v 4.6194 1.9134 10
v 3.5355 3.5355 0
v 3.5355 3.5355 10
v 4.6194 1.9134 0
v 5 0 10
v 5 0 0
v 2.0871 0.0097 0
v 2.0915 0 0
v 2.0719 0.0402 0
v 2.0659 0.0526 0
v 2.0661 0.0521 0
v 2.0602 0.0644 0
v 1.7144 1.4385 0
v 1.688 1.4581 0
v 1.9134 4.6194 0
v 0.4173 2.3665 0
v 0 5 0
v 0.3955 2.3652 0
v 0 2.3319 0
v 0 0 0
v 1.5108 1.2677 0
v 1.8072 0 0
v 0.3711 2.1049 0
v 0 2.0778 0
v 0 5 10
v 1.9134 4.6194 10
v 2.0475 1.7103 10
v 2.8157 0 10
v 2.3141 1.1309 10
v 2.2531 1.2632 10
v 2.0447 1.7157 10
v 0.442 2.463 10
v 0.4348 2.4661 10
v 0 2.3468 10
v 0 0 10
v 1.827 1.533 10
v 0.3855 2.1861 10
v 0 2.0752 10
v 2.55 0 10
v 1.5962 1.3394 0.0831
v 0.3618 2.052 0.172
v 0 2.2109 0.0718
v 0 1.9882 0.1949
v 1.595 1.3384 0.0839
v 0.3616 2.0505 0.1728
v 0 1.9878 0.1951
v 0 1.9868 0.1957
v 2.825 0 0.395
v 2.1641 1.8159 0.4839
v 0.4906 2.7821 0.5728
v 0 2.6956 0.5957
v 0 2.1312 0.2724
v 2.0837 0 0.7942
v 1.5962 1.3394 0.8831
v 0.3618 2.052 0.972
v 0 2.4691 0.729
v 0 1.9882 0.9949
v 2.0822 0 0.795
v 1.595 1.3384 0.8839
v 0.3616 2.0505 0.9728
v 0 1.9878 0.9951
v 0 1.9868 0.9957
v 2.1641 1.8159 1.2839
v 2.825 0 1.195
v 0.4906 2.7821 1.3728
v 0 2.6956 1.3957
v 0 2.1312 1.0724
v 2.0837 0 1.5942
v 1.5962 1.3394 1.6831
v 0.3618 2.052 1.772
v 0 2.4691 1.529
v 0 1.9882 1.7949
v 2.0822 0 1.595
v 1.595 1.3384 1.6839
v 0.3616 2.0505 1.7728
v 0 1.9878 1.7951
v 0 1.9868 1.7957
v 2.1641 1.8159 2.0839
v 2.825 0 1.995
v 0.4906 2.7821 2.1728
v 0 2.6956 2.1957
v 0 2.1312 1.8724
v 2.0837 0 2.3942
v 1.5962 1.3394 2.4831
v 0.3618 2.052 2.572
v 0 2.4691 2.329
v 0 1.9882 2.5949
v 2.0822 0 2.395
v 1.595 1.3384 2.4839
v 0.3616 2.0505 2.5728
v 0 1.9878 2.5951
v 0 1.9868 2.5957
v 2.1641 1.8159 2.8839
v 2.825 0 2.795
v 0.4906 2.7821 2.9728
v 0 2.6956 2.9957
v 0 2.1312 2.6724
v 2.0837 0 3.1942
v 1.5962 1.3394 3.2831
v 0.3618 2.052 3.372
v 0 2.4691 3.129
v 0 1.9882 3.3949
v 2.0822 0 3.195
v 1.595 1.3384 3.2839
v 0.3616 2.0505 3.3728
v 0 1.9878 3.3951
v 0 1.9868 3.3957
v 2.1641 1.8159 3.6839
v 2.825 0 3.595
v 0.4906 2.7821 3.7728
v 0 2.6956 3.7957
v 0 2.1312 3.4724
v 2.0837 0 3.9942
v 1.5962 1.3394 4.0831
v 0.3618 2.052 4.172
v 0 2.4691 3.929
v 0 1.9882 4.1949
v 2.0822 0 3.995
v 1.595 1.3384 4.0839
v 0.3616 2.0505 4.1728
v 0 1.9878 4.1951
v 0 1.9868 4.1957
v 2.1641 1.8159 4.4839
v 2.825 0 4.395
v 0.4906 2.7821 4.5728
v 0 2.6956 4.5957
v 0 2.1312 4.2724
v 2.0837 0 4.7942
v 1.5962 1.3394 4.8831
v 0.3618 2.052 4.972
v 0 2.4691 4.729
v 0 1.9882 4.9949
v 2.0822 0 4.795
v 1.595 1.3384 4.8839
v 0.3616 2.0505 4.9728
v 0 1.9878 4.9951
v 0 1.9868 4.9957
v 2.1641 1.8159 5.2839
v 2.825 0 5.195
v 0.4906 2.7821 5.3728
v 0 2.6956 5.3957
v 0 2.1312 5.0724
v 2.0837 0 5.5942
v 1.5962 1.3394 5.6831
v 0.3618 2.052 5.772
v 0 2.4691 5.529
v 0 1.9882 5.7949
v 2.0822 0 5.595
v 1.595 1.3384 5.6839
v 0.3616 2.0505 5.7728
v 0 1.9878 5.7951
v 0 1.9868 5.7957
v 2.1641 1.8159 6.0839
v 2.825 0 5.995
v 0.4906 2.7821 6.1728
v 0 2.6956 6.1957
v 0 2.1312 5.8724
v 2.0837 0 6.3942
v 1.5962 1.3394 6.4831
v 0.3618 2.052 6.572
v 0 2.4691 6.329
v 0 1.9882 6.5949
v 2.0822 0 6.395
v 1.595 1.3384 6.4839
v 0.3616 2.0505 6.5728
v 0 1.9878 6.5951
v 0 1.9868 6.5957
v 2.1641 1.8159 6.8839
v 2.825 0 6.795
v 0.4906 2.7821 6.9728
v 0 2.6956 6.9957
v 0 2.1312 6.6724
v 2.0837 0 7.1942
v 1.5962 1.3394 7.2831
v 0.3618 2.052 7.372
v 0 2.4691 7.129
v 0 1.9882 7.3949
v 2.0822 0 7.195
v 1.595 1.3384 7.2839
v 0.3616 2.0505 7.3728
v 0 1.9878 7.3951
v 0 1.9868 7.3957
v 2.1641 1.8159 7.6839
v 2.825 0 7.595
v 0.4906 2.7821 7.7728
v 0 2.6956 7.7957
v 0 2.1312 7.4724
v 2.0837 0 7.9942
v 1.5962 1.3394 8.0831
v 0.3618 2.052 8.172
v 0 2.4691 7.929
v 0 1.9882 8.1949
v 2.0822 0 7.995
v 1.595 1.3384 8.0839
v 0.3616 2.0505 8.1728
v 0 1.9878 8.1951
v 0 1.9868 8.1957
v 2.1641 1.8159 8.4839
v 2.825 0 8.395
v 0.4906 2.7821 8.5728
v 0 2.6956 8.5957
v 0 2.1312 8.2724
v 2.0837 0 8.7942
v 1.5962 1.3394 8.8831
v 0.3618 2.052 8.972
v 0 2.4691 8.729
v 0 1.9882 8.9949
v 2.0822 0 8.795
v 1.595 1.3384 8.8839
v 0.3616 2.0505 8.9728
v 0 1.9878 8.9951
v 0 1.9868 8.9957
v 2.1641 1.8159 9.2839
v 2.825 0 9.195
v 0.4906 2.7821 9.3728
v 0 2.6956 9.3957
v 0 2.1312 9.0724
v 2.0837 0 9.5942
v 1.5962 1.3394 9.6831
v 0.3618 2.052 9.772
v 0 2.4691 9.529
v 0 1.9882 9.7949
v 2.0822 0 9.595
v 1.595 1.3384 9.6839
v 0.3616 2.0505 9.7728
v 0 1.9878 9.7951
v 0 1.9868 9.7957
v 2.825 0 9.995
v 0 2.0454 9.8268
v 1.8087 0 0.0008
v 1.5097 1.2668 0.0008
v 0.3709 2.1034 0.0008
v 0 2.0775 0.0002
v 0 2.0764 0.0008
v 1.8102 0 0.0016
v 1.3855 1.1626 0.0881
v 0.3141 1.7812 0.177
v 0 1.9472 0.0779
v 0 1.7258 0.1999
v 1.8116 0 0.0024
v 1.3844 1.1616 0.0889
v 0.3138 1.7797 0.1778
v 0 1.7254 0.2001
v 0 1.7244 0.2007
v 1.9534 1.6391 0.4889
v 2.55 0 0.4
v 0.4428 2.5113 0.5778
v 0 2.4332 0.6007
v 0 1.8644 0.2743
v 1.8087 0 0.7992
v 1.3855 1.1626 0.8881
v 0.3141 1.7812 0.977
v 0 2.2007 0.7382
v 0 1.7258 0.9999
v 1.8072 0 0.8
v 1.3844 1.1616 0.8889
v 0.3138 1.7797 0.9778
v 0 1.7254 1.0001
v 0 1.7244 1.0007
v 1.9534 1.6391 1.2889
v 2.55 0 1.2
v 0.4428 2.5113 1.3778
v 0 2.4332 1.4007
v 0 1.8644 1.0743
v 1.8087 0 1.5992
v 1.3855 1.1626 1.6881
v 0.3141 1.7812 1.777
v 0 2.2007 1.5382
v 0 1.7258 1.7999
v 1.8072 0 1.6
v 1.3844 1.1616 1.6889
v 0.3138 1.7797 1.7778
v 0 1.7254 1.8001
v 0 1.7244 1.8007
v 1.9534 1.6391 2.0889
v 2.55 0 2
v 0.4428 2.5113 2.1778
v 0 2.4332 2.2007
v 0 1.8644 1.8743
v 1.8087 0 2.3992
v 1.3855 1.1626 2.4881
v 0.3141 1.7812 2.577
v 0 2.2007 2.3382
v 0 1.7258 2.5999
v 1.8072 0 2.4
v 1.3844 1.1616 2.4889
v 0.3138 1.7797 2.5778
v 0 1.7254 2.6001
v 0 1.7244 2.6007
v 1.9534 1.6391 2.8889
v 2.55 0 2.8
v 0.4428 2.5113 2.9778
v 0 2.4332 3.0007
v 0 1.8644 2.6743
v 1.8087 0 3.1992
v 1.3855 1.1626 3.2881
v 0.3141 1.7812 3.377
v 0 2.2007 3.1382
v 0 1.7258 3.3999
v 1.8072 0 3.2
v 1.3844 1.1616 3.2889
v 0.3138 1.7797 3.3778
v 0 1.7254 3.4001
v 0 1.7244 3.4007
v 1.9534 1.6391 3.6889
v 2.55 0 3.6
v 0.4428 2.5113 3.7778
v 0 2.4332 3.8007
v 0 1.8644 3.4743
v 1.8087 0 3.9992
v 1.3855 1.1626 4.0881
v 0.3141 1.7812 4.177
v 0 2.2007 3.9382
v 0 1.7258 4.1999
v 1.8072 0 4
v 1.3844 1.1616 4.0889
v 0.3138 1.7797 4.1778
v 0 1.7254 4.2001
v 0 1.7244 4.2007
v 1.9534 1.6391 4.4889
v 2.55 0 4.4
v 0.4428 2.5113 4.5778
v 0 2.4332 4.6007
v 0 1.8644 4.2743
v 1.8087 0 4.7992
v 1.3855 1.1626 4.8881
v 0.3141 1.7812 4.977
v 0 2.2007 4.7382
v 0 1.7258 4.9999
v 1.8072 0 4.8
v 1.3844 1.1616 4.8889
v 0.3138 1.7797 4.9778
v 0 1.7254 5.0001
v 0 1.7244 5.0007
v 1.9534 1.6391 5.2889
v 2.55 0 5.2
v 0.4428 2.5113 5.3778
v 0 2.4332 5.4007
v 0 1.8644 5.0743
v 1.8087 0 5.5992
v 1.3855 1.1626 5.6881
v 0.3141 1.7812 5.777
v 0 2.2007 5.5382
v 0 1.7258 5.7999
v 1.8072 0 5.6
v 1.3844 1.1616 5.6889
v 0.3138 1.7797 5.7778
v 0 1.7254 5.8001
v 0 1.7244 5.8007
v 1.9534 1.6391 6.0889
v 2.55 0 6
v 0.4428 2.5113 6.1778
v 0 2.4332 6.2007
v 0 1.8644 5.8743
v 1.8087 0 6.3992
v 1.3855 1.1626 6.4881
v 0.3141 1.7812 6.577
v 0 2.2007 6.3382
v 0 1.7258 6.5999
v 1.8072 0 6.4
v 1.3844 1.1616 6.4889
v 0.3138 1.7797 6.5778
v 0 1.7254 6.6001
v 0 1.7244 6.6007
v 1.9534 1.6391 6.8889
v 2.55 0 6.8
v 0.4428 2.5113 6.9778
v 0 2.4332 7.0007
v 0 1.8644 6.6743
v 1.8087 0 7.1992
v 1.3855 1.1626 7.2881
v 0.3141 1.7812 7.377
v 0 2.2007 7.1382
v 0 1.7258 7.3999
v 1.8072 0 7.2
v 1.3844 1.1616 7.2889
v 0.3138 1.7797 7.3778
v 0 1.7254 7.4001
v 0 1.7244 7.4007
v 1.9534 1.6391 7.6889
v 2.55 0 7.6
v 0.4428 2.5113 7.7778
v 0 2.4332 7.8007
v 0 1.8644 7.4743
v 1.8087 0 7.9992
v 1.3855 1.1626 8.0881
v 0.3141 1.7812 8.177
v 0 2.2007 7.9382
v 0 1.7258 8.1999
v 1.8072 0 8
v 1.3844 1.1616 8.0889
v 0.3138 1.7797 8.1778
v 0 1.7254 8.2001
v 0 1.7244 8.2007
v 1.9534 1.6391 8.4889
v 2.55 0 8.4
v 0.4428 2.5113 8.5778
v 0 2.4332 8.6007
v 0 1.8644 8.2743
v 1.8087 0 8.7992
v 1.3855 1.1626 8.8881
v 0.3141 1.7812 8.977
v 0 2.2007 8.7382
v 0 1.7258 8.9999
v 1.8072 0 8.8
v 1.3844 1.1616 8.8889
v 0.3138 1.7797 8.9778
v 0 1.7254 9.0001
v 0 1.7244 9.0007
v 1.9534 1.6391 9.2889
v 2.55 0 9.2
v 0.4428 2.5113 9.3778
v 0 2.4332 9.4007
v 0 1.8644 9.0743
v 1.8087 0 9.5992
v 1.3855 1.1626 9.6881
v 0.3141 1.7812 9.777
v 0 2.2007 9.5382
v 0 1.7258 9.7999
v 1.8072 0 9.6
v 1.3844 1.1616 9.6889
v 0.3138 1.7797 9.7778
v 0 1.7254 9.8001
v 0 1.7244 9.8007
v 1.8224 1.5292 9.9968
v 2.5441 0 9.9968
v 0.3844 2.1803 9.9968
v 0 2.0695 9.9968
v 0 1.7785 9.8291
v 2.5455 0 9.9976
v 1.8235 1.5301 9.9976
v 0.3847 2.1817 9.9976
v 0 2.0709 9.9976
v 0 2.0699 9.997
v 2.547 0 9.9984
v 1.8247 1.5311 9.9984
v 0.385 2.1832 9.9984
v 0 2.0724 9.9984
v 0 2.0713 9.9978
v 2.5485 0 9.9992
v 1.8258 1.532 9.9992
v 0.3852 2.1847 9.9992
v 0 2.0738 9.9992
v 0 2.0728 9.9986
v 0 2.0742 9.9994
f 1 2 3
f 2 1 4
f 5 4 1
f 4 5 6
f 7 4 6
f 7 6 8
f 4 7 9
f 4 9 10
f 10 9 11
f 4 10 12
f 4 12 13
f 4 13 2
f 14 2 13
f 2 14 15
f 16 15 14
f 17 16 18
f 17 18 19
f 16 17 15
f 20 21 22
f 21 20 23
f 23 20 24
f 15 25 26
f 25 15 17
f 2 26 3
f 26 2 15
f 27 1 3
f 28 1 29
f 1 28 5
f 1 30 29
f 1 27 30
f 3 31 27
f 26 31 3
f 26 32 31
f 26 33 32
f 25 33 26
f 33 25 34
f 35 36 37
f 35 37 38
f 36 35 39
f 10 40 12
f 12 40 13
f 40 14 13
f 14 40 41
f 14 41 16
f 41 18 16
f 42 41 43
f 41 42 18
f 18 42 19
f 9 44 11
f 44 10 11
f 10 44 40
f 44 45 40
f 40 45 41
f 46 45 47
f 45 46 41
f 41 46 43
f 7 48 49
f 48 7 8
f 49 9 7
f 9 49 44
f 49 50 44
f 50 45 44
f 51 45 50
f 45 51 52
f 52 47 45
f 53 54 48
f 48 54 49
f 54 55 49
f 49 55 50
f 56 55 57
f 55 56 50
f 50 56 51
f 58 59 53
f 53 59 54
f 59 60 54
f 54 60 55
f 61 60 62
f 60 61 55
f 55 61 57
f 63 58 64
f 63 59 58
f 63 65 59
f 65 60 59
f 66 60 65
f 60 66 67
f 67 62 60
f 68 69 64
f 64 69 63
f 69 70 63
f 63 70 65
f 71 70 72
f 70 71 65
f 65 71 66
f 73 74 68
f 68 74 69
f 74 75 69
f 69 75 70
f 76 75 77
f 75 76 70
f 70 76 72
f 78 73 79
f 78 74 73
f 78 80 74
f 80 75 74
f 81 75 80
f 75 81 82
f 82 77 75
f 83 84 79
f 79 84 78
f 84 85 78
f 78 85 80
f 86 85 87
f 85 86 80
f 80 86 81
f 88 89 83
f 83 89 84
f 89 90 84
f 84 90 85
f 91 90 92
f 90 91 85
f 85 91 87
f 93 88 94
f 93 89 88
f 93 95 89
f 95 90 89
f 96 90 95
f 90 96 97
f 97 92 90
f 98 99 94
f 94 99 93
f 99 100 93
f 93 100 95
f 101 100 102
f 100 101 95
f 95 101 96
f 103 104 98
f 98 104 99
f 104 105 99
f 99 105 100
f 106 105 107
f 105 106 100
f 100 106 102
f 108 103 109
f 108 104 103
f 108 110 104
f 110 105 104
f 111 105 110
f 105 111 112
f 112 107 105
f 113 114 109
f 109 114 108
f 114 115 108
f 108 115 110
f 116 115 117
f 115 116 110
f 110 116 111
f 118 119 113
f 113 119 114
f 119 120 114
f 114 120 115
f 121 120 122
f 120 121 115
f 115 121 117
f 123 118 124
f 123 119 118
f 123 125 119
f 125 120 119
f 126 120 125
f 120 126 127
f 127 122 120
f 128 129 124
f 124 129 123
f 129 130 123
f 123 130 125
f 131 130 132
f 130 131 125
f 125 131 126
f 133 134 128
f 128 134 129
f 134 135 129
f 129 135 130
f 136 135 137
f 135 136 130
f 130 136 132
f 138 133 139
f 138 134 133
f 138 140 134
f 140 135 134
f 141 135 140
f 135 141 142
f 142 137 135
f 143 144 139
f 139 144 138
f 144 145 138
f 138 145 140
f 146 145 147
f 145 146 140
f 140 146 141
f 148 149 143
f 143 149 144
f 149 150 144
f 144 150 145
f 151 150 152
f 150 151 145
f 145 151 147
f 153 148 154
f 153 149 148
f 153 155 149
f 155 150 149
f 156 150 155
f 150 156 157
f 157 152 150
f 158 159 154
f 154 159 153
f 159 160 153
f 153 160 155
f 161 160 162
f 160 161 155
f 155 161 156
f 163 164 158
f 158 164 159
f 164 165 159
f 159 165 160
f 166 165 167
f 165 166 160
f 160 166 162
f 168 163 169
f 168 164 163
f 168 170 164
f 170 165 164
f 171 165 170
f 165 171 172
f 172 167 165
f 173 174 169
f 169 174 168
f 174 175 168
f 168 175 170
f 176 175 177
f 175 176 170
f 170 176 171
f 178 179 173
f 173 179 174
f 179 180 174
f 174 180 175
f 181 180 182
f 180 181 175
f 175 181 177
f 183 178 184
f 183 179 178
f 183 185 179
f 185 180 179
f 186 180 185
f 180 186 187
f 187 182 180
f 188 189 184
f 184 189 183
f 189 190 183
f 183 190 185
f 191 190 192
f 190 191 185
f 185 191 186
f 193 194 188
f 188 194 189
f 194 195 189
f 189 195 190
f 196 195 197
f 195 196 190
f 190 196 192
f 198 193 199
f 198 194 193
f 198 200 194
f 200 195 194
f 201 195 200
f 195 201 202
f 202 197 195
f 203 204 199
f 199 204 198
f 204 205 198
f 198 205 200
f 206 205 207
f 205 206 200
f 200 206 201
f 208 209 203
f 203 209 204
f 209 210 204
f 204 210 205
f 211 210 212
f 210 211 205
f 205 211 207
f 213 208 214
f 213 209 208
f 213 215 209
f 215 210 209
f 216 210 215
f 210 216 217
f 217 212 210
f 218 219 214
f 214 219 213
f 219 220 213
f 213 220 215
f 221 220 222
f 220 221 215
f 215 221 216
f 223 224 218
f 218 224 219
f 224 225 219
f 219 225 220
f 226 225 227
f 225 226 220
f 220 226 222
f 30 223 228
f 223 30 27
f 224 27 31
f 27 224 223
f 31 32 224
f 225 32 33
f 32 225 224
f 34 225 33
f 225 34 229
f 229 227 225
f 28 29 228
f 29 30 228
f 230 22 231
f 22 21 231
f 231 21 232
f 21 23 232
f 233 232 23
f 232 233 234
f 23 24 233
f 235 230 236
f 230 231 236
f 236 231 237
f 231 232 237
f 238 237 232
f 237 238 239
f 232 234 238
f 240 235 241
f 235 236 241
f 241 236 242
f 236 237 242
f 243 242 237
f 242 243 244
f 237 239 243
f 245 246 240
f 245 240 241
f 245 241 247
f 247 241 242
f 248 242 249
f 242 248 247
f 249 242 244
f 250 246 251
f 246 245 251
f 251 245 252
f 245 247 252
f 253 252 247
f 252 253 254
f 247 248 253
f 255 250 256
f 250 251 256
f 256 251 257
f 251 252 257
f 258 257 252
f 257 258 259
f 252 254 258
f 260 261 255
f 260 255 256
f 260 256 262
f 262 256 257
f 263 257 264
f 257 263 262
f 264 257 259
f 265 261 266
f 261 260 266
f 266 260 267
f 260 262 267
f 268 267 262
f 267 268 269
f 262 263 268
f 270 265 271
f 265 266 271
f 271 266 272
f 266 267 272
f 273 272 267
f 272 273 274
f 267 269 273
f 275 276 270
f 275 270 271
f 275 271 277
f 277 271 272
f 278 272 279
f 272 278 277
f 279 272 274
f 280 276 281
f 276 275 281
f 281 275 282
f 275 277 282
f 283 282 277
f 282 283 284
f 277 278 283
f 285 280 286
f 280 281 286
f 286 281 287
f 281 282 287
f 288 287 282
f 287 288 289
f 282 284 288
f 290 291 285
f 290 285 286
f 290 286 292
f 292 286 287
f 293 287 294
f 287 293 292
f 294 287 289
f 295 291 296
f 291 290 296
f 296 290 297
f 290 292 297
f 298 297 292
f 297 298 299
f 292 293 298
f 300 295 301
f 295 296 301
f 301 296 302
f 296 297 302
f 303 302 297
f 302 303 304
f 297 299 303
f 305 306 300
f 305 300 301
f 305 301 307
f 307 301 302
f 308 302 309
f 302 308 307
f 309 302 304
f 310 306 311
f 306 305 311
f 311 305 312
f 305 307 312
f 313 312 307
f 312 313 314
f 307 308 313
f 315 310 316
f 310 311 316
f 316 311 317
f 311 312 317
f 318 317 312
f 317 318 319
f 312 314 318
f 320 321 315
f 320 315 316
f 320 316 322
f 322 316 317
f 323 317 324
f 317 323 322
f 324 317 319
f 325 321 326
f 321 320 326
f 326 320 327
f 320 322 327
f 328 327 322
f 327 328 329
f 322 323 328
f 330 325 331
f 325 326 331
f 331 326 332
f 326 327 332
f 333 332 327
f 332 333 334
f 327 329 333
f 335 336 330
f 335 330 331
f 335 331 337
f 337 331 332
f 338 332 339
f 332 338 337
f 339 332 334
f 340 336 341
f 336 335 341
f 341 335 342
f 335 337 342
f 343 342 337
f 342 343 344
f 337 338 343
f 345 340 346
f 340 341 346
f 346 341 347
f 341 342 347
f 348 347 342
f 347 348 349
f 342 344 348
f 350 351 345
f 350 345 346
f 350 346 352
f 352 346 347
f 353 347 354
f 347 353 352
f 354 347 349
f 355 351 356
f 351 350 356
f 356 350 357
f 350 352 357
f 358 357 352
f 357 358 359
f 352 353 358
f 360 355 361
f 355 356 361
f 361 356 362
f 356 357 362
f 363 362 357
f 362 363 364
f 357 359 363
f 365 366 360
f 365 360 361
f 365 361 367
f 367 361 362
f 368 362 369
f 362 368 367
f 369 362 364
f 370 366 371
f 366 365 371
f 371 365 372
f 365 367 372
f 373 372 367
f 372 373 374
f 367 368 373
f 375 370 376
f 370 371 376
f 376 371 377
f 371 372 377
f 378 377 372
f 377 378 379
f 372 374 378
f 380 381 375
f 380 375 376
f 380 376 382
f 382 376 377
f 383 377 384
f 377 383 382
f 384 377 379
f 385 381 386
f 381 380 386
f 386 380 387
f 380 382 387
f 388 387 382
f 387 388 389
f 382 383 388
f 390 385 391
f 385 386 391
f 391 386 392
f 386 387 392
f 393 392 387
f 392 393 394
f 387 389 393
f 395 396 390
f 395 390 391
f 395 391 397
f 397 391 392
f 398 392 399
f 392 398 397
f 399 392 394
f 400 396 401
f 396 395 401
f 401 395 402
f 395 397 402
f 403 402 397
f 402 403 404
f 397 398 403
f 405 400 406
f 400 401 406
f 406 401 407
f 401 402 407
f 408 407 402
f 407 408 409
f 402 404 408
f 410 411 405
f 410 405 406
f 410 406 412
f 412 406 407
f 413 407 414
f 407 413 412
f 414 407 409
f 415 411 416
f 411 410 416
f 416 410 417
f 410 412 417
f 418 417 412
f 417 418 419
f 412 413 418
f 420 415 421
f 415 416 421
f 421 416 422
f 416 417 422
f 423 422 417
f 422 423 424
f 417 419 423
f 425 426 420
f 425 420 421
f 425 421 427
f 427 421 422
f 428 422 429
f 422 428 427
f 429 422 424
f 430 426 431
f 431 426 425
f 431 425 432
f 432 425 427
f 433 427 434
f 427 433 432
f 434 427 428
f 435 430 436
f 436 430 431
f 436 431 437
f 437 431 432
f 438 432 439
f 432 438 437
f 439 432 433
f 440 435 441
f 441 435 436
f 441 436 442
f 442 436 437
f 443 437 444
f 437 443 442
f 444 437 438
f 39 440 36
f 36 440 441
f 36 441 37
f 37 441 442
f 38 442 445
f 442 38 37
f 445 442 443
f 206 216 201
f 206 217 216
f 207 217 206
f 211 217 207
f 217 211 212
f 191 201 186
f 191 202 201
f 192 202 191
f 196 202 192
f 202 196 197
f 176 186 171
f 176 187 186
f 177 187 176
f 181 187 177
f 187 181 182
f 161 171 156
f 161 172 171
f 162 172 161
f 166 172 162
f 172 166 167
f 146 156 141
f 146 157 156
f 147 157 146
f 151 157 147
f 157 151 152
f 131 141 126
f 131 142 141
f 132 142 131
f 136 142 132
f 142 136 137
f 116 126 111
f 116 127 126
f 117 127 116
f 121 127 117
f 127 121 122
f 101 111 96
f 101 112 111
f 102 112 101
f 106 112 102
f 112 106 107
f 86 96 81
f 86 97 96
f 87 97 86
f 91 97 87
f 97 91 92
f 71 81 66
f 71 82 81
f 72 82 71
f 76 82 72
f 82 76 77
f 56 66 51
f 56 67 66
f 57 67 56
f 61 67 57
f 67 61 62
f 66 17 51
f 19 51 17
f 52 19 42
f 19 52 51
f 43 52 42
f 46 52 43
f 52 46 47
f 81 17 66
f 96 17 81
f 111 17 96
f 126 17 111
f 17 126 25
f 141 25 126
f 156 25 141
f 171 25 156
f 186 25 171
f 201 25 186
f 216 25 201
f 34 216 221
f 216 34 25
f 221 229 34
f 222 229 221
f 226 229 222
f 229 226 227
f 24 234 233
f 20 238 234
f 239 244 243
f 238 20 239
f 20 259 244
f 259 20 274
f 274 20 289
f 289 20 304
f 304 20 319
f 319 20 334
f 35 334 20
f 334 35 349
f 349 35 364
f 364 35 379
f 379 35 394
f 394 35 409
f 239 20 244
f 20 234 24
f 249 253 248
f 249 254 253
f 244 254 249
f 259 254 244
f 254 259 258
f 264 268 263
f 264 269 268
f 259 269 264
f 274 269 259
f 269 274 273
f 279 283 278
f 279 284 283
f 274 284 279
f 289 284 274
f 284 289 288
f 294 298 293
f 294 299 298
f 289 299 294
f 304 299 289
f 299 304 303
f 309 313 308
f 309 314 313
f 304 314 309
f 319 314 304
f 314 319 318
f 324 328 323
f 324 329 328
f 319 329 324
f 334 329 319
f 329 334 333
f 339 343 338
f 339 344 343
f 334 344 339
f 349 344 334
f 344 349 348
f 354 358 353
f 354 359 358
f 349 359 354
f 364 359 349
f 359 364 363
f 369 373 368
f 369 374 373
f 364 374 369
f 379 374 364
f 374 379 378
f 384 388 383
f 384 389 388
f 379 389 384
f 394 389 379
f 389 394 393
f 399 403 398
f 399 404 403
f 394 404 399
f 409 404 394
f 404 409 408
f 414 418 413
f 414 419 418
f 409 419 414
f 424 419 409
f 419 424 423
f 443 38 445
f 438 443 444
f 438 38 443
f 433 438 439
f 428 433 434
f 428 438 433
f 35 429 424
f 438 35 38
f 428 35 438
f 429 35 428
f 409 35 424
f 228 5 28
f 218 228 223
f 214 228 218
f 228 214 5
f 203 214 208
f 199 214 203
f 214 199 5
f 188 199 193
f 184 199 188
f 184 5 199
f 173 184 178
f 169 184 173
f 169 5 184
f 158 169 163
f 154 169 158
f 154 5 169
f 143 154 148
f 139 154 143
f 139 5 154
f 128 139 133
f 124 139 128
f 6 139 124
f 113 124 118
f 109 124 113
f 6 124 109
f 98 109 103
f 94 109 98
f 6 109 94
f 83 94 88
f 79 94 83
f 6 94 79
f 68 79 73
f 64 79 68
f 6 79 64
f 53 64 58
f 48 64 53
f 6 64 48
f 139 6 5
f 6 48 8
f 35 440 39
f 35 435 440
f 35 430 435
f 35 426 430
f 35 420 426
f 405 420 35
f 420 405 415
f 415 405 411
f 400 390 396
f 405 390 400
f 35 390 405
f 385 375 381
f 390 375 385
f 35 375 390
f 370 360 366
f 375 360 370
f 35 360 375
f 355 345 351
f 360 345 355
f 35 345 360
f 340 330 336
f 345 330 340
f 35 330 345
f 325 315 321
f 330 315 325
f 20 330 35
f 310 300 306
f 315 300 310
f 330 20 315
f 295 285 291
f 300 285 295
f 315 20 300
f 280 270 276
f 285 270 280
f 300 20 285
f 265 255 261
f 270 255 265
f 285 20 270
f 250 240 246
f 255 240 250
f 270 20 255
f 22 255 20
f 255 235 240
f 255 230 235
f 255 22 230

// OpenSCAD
// Created 2016-2017 by Ryan A. Colyer.
// This work is released with CC0 into the public domain.
// https://creativecommons.org/publicdomain/zero/1.0/
//
// https://www.thingiverse.com/thing:1686322
//
// v2.1


default_screw_resolution = 2; // in mm; override by setting $screw_resolution


// Provides standard metric thread pitches.
function ThreadPitch(diameter) =
  (diameter <= 64) ?
    lookup(diameter, [
      [2, 0.4],
      [2.5, 0.45],
      [3, 0.5],
      [4, 0.7],
      [5, 0.8],
      [6, 1.0],
      [7, 1.0],
      [8, 1.25],
      [10, 1.5],
      [12, 1.75],
      [14, 2.0],
      [16, 2.0],
      [18, 2.5],
      [20, 2.5],
      [22, 2.5],
      [24, 3.0],
      [27, 3.0],
      [30, 3.5],
      [33, 3.5],
      [36, 4.0],
      [39, 4.0],
      [42, 4.5],
      [48, 5.0],
      [52, 5.0],
      [56, 5.5],
      [60, 5.5],
      [64, 6.0]
    ]) :
    diameter * 6.0 / 64;


// Provides standard metric hex head widths across the flats.
function HexAcrossFlats(diameter) =
  (diameter <= 64) ?
    lookup(diameter, [
      [2, 4],
      [2.5, 5],
      [3, 5.5],
      [3.5, 6],
      [4, 7],
      [5, 8],
      [6, 10],
      [7, 11],
      [8, 13],
      [10, 16],
      [12, 18],
      [14, 21],
      [16, 24],
      [18, 27],
      [20, 30],
      [22, 34],
      [24, 36],
      [27, 41],
      [30, 46],
      [33, 50],
      [36, 55],
      [39, 60],
      [42, 65],
      [48, 75],
      [52, 80],
      [56, 85],
      [60, 90],
      [64, 95]
    ]) :
    diameter * 95 / 64;

// Provides standard metric hex head widths across the corners.
function HexAcrossCorners(diameter) =
  HexAcrossFlats(diameter) / cos(30);


// Provides standard metric hex (Allen) drive widths across the flats.
function HexDriveAcrossFlats(diameter) =
  (diameter <= 64) ?
    lookup(diameter, [
      [2, 1.5],
      [2.5, 2],
      [3, 2.5],
      [3.5, 3],
      [4, 3],
      [5, 4],
      [6, 5],
      [7, 5],
      [8, 6],
      [10, 8],
      [12, 10],
      [14, 12],
      [16, 14],
      [18, 15],
      [20, 17],
      [22, 18],
      [24, 19],
      [27, 20],
      [30, 22],
      [33, 24],
      [36, 27],
      [39, 30],
      [42, 32],
      [48, 36],
      [52, 36],
      [56, 41],
      [60, 42],
      [64, 46]
    ]) :
    diameter * 46 / 64;

// Provides standard metric hex (Allen) drive widths across the corners.
function HexDriveAcrossCorners(diameter) =
  HexDriveAcrossFlats(diameter) / cos(30);

// Provides metric countersunk hex (Allen) drive widths across the flats.
function CountersunkDriveAcrossFlats(diameter) =
  (diameter <= 14) ?
    HexDriveAcrossFlats(HexDriveAcrossFlats(diameter)) :
    round(0.6*diameter);

// Provides metric countersunk hex (Allen) drive widths across the corners.
function CountersunkDriveAcrossCorners(diameter) =
  CountersunkDriveAcrossFlats(diameter) / cos(30);

// Provides standard metric nut thickness.
function NutThickness(diameter) =
  (diameter <= 64) ?
    lookup(diameter, [
      [2, 1.6],
      [2.5, 2],
      [3, 2.4],
      [3.5, 2.8],
      [4, 3.2],
      [5, 4.7],
      [6, 5.2],
      [7, 6.0],
      [8, 6.8],
      [10, 8.4],
      [12, 10.8],
      [14, 12.8],
      [16, 14.8],
      [18, 15.8],
      [20, 18.0],
      [22, 21.1],
      [24, 21.5],
      [27, 23.8],
      [30, 25.6],
      [33, 28.7],
      [36, 31.0],
      [42, 34],
      [48, 38],
      [56, 45],
      [64, 51]
    ]) :
    diameter * 51 / 64;


// This generates a closed polyhedron from an array of arrays of points,
// with each inner array tracing out one loop outlining the polyhedron.
// pointarrays should contain an array of N arrays each of size P outlining a
// closed manifold.  The points must obey the right-hand rule.  For example,
// looking down, the P points in the inner arrays are counter-clockwise in a
// loop, while the N point arrays increase in height.  Points in each inner
// array do not need to be equal height, but they usually should not meet or
// cross the line segments from the adjacent points in the other arrays.
// (N>=2, P>=3)
// Core triangles:
//   [j][i], [j+1][i], [j+1][(i+1)%P]
//   [j][i], [j+1][(i+1)%P], [j][(i+1)%P]
//   Then triangles are formed in a loop with the middle point of the first
//   and last array.
module ClosePoints(pointarrays) {
  function recurse_avg(arr, n=0, p=[0,0,0]) = (n>=len(arr)) ? p :
    recurse_avg(arr, n+1, p+(arr[n]-p)/(n+1));

  N = len(pointarrays);
  P = len(pointarrays[0]);
  NP = N*P;
  lastarr = pointarrays[N-1];
  midbot = recurse_avg(pointarrays[0]);
  midtop = recurse_avg(pointarrays[N-1]);

  faces_bot = [
    for (i=[0:P-1])
      [0,i+1,1+(i+1)%len(pointarrays[0])]
  ];

  loop_offset = 1;
  bot_len = loop_offset + P;

  faces_loop = [
    for (j=[0:N-2], i=[0:P-1], t=[0:1])
      [loop_offset, loop_offset, loop_offset] + (t==0 ?
      [j*P+i, (j+1)*P+i, (j+1)*P+(i+1)%P] :
      [j*P+i, (j+1)*P+(i+1)%P, j*P+(i+1)%P])
  ];

  top_offset = loop_offset + NP - P;
  midtop_offset = top_offset + P;

  faces_top = [
    for (i=[0:P-1])
      [midtop_offset,top_offset+(i+1)%P,top_offset+i]
  ];

  points = [
    for (i=[-1:NP])
      (i<0) ? midbot :
      ((i==NP) ? midtop :
      pointarrays[floor(i/P)][i%P])
  ];
  faces = concat(faces_bot, faces_loop, faces_top);

  polyhedron(points=points, faces=faces, convexity=2);
}



// This creates a vertical rod at the origin with external threads.  It uses
// metric standards by default.
module ScrewThread(outer_diam, height, pitch=0, tooth_angle=30, tolerance=0.4, tip_height=0, tooth_height=0, tip_min_fract=0) {
  screw_resolution = is_undef($screw_resolution) ? default_screw_resolution : $screw_resolution;

  pitch = (pitch==0) ? ThreadPitch(outer_diam) : pitch;
  tooth_height = (tooth_height==0) ? pitch : tooth_height;
  tip_min_fract = (tip_min_fract<0) ? 0 :
    ((tip_min_fract>0.9999) ? 0.9999 : tip_min_fract);

  outer_diam_cor = outer_diam + 0.25*tolerance; // Plastic shrinkage correction
  inner_diam = outer_diam - tooth_height/tan(tooth_angle);
  or = (outer_diam_cor < screw_resolution) ?
    screw_resolution/2 : outer_diam_cor / 2;
  ir = (inner_diam < screw_resolution) ? screw_resolution/2 : inner_diam / 2;
  height = (height < screw_resolution) ? screw_resolution : height;

  steps_per_loop_try = ceil(2*3.14159265359*or / screw_resolution);
  steps_per_loop = (steps_per_loop_try < 4) ? 4 : steps_per_loop_try;
  hs_ext = 3;
  hsteps = ceil(3 * height / pitch) + 2*hs_ext;

  extent = or - ir;

  tip_start = height-tip_height;
  tip_height_sc = tip_height / (1-tip_min_fract);

  tip_height_ir = (tip_height_sc > tooth_height/2) ?
    tip_height_sc - tooth_height/2 : tip_height_sc;

  tip_height_w = (tip_height_sc > tooth_height) ? tooth_height : tip_height_sc;
  tip_wstart = height + tip_height_sc - tip_height - tip_height_w;


  function tooth_width(a, h, pitch, tooth_height, extent) =
    let(
      ang_full = h*360.0/pitch-a,
      ang_pn = atan2(sin(ang_full), cos(ang_full)),
      ang = ang_pn < 0 ? ang_pn+360 : ang_pn,
      frac = ang/360,
      tfrac_half = tooth_height / (2*pitch),
      tfrac_cut = 2*tfrac_half
    )
    (frac > tfrac_cut) ? 0 : (
      (frac <= tfrac_half) ?
        ((frac / tfrac_half) * extent) :
        ((1 - (frac - tfrac_half)/tfrac_half) * extent)
    );


  pointarrays = [
    for (hs=[0:hsteps])
      [
        for (s=[0:steps_per_loop-1])
          let(
            ang_full = s*360.0/steps_per_loop,
            ang_pn = atan2(sin(ang_full), cos(ang_full)),
            ang = ang_pn < 0 ? ang_pn+360 : ang_pn,

            h_fudge = pitch*0.001,

            h_mod =
              (hs%3 == 2) ?
                ((s == steps_per_loop-1) ? tooth_height - h_fudge : (
                 (s == steps_per_loop-2) ? tooth_height/2 : 0)) : (
              (hs%3 == 0) ?
                ((s == steps_per_loop-1) ? pitch-tooth_height/2 : (
                 (s == steps_per_loop-2) ? pitch-tooth_height + h_fudge : 0)) :
                ((s == steps_per_loop-1) ? pitch-tooth_height/2 + h_fudge : (
                 (s == steps_per_loop-2) ? tooth_height/2 : 0))
              ),

            h_level =
              (hs%3 == 2) ? tooth_height - h_fudge : (
              (hs%3 == 0) ? 0 : tooth_height/2),

            h_ub = floor((hs-hs_ext)/3) * pitch
              + h_level + ang*pitch/360.0 - h_mod,
            h_max = height - (hsteps-hs) * h_fudge,
            h_min = hs * h_fudge,
            h = (h_ub < h_min) ? h_min : ((h_ub > h_max) ? h_max : h_ub),

            ht = h - tip_start,
            hf_ir = ht/tip_height_ir,
            ht_w = h - tip_wstart,
            hf_w_t = ht_w/tip_height_w,
            hf_w = (hf_w_t < 0) ? 0 : ((hf_w_t > 1) ? 1 : hf_w_t),

            ext_tip = (h <= tip_wstart) ? extent : (1-hf_w) * extent,
            wnormal = tooth_width(ang, h, pitch, tooth_height, ext_tip),
            w = (h <= tip_wstart) ? wnormal :
              (1-hf_w) * wnormal +
              hf_w * (0.1*screw_resolution + (wnormal * wnormal * wnormal /
                (ext_tip*ext_tip+0.1*screw_resolution))),
            r = (ht <= 0) ? ir + w :
              ( (ht < tip_height_ir ? ((2/(1+(hf_ir*hf_ir))-1) * ir) : 0) + w)
          )
          [r*cos(ang), r*sin(ang), h]
      ]
  ];


  ClosePoints(pointarrays);
}


// This creates a vertical rod at the origin with external auger-style
// threads.
module AugerThread(outer_diam, inner_diam, height, pitch, tooth_angle=30, tolerance=0.4, tip_height=0, tip_min_fract=0) {
  tooth_height = tan(tooth_angle)*(outer_diam-inner_diam);
  ScrewThread(outer_diam, height, pitch, tooth_angle, tolerance, tip_height,
    tooth_height, tip_min_fract);
}


// This creates a threaded hole in its children using metric standards by
// default.
module ScrewHole(outer_diam, height, position=[0,0,0], rotation=[0,0,0], pitch=0, tooth_angle=30, tolerance=0.4, tooth_height=0, tip_height=0, tip_min_fract=0) {
  extra_height = 0.001 * height;
  pitch = (pitch==0) ? ThreadPitch(outer_diam) : pitch;

  difference() {
    children();
    translate(position)
      rotate(rotation)
      translate([0, 0, -extra_height/2])
      ScrewThread(1.01*outer_diam + 1.25*tolerance, height + extra_height,
        pitch, tooth_angle, tolerance, tooth_height=tooth_height, tip_height=tip_height, tip_min_fract=tip_min_fract);
  }
}


// This creates an auger-style threaded hole in its children.
module AugerHole(outer_diam, inner_diam, height, pitch, position=[0,0,0], rotation=[0,0,0], tooth_angle=30, tolerance=0.4) {
  tooth_height = tan(tooth_angle)*(outer_diam-inner_diam);
  ScrewHole(outer_diam, height, position, rotation, pitch, tooth_angle,
    tolerance, tooth_height=tooth_height);
}


// This inserts a ClearanceHole in its children.
// The rotation vector is applied first, then the position translation,
// starting from a position upward from the z-axis at z=0.
module ClearanceHole(diameter, height, position=[0,0,0], rotation=[0,0,0], tolerance=0.4) {
  extra_height = 0.001 * height;

  difference() {
    children();
    translate(position)
      rotate(rotation)
      translate([0, 0, -extra_height/2])
      cylinder(h=height + extra_height, r=(diameter/2+tolerance));
  }
}


// This inserts a ClearanceHole with a recessed bolt hole in its children.
// The rotation vector is applied first, then the position translation,
// starting from a position upward from the z-axis at z=0.  The default
// recessed parameters fit a standard metric bolt.
module RecessedClearanceHole(diameter, height, position=[0,0,0], rotation=[0,0,0], recessed_diam=-1, recessed_height=-1, tolerance=0.4) {
  recessed_diam = (recessed_diam < 0) ?
    HexAcrossCorners(diameter) : recessed_diam;
  recessed_height = (recessed_height < 0) ? diameter : recessed_height;
  extra_height = 0.001 * height;

  difference() {
    children();
    translate(position)
      rotate(rotation)
      translate([0, 0, -extra_height/2])
      cylinder(h=height + extra_height, r=(diameter/2+tolerance));
    translate(position)
      rotate(rotation)
      translate([0, 0, -extra_height/2])
      cylinder(h=recessed_height + extra_height/2,
        r=(recessed_diam/2+tolerance));
  }
}


// This inserts a countersunk ClearanceHole in its children.
// The rotation vector is applied first, then the position translation,
// starting from a position upward from the z-axis at z=0.
// The countersunk side is on the bottom by default.
module CountersunkClearanceHole(diameter, height, position=[0,0,0], rotation=[0,0,0], sinkdiam=0, sinkangle=45, tolerance=0.4) {
  extra_height = 0.001 * height;
  sinkdiam = (sinkdiam==0) ? 2*diameter : sinkdiam;
  sinkheight = ((sinkdiam-diameter)/2)/tan(sinkangle);

  difference() {
    children();
    translate(position)
      rotate(rotation)
      translate([0, 0, -extra_height/2])
      union() {
        cylinder(h=height + extra_height, r=(diameter/2+tolerance));
        cylinder(h=sinkheight + extra_height, r1=(sinkdiam/2+tolerance), r2=(diameter/2+tolerance), $fn=24*diameter);
      }
  }
}


// This inserts a Phillips tip shaped hole into its children.
// The rotation vector is applied first, then the position translation,
// starting from a position upward from the z-axis at z=0.
module PhillipsTip(width=7, thickness=0, straightdepth=0, position=[0,0,0], rotation=[0,0,0]) {
  thickness = (thickness <= 0) ? width*2.5/7 : thickness;
  straightdepth = (straightdepth <= 0) ? width*3.5/7 : straightdepth;
  angledepth = (width-thickness)/2;
  height = straightdepth + angledepth;
  extra_height = 0.001 * height;

  difference() {
    children();
    translate(position)
      rotate(rotation)
      union() {
        hull() {
          translate([-width/2, -thickness/2, -extra_height/2])
            cube([width, thickness, straightdepth+extra_height]);
          translate([-thickness/2, -thickness/2, height-extra_height])
            cube([thickness, thickness, extra_height]);
        }
        hull() {
          translate([-thickness/2, -width/2, -extra_height/2])
            cube([thickness, width, straightdepth+extra_height]);
          translate([-thickness/2, -thickness/2, height-extra_height])
            cube([thickness, thickness, extra_height]);
        }
      }
  }
}



// Create a standard sized metric bolt with hex head and hex key.
module MetricBolt(diameter, length, tolerance=0.4) {
  drive_tolerance = pow(3*tolerance/HexDriveAcrossCorners(diameter),2)
    + 0.75*tolerance;

  difference() {
    cylinder(h=diameter, r=(HexAcrossCorners(diameter)/2-0.5*tolerance), $fn=6);
    cylinder(h=diameter,
      r=(HexDriveAcrossCorners(diameter)+drive_tolerance)/2, $fn=6,
      center=true);
  }
  translate([0,0,diameter-0.01])
    ScrewThread(diameter, length+0.01, tolerance=tolerance,
      tip_height=ThreadPitch(diameter), tip_min_fract=0.75);
}


// Create a standard sized metric countersunk (flat) bolt with hex key drive.
// In compliance with convention, the length for this includes the head.
module MetricCountersunkBolt(diameter, length, tolerance=0.4) {
  drive_tolerance = pow(3*tolerance/CountersunkDriveAcrossCorners(diameter),2)
    + 0.75*tolerance;

  difference() {
    cylinder(h=diameter/2, r1=diameter, r2=diameter/2, $fn=24*diameter);
    cylinder(h=0.8*diameter,
      r=(CountersunkDriveAcrossCorners(diameter)+drive_tolerance)/2, $fn=6,
      center=true);
  }
  translate([0,0,diameter/2-0.01])
    ScrewThread(diameter, length-diameter/2+0.01, tolerance=tolerance,
      tip_height=ThreadPitch(diameter), tip_min_fract=0.75);
}


// Create a standard sized metric countersunk (flat) bolt with hex key drive.
// In compliance with convention, the length for this includes the head.
module MetricWoodScrew(diameter, length, tolerance=0.4) {
  drive_tolerance = pow(3*tolerance/CountersunkDriveAcrossCorners(diameter),2)
    + 0.75*tolerance;

  PhillipsTip(diameter-2)
    union() {
      cylinder(h=diameter/2, r1=diameter, r2=diameter/2, $fn=24*diameter);

      translate([0,0,diameter/2-0.01])
        ScrewThread(diameter, length-diameter/2+0.01, tolerance=tolerance,
          tip_height=diameter);
    }
}


// Create a standard sized metric hex nut.
module MetricNut(diameter, thickness=0, tolerance=0.4) {
  thickness = (thickness==0) ? NutThickness(diameter) : thickness;
  ScrewHole(diameter, thickness, tolerance=tolerance)
    cylinder(h=thickness, r=HexAcrossCorners(diameter)/2-0.5*tolerance, $fn=6);
}


// Create a convenient washer size for a metric nominal thread diameter.
module MetricWasher(diameter) {
  difference() {
    cylinder(h=diameter/5, r=1.15*diameter, $fn=24*diameter);
    cylinder(h=2*diameter, r=0.575*diameter, $fn=12*diameter, center=true);
  }
}


// Solid rod on the bottom, external threads on the top.
module RodStart(diameter, height, thread_len=0, thread_diam=0, thread_pitch=0) {
  // A reasonable default.
  thread_diam = (thread_diam==0) ? 0.75*diameter : thread_diam;
  thread_len = (thread_len==0) ? 0.5*diameter : thread_len;
  thread_pitch = (thread_pitch==0) ? ThreadPitch(thread_diam) : thread_pitch;

  cylinder(r=diameter/2, h=height, $fn=24*diameter);

  translate([0, 0, height])
    ScrewThread(thread_diam, thread_len, thread_pitch,
      tip_height=thread_pitch, tip_min_fract=0.75);
}


// Solid rod on the bottom, internal threads on the top.
// Flips around x-axis after printing to pair with RodStart.
module RodEnd(diameter, height, thread_len=0, thread_diam=0, thread_pitch=0) {
  // A reasonable default.
  thread_diam = (thread_diam==0) ? 0.75*diameter : thread_diam;
  thread_len = (thread_len==0) ? 0.5*diameter : thread_len;
  thread_pitch = (thread_pitch==0) ? ThreadPitch(thread_diam) : thread_pitch;

  ScrewHole(thread_diam, thread_len, [0, 0, height], [180,0,0], thread_pitch)
    cylinder(r=diameter/2, h=height, $fn=24*diameter);
}


// Internal threads on the bottom, external threads on the top.
module RodExtender(diameter, height, thread_len=0, thread_diam=0, thread_pitch=0) {
  // A reasonable default.
  thread_diam = (thread_diam==0) ? 0.75*diameter : thread_diam;
  thread_len = (thread_len==0) ? 0.5*diameter : thread_len;
  thread_pitch = (thread_pitch==0) ? ThreadPitch(thread_diam) : thread_pitch;

  max_bridge = height - thread_len;
  // Use 60 degree slope if it will fit.
  bridge_height = ((thread_diam/4) < max_bridge) ? thread_diam/4 : max_bridge;

  difference() {
    union() {
      ScrewHole(thread_diam, thread_len, pitch=thread_pitch)
        cylinder(r=diameter/2, h=height, $fn=24*diameter);

      translate([0,0,height])
        ScrewThread(thread_diam, thread_len, pitch=thread_pitch,
          tip_height=thread_pitch, tip_min_fract=0.75);
    }
    // Carve out a small conical area as a bridge.
    translate([0,0,thread_len])
      cylinder(h=bridge_height, r1=thread_diam/2, r2=0.1);
  }
}


// Produces a matching set of metric bolts, nuts, and washers.
module MetricBoltSet(diameter, length, quantity=1) {
  for (i=[0:quantity-1]) {
    translate([0, i*4*diameter, 0]) MetricBolt(diameter, length);
    translate([4*diameter, i*4*diameter, 0]) MetricNut(diameter);
    translate([8*diameter, i*4*diameter, 0]) MetricWasher(diameter);
  }
}


module Demo() {
  translate([0,-0,0]) MetricBoltSet(3, 8);
  translate([0,-20,0]) MetricBoltSet(4, 8);
  translate([0,-40,0]) MetricBoltSet(5, 8);
  translate([0,-60,0]) MetricBoltSet(6, 8);
  translate([0,-80,0]) MetricBoltSet(8, 8);

  translate([0,25,0]) MetricCountersunkBolt(5, 10);
  translate([23,18,5])
    scale([1,1,-1])
    CountersunkClearanceHole(5, 8, [7,7,0], [0,0,0])
    cube([14, 14, 5]);

  translate([70, -10, 0])
    RodStart(20, 30);
  translate([70, 20, 0])
    RodEnd(20, 30);

  translate([70, -45, 0])
    MetricWoodScrew(8, 20);

  translate([12, 50, 0])
    union() {
      translate([0, 0, 5.99])
        AugerThread(15, 3.5, 22, 7, tooth_angle=15, tip_height=7);
      translate([-4, -9, 0]) cube([8, 18, 6]);
    }
}


module ThreadCheck() {
  d=5;
  h=10;
  intersection() {
    union() {
      ScrewThread(d, h);
      ScrewHole(d, h)
      cylinder(d=h,h=h);
    }
    cube(h);
  }
}


//Demo();
ThreadCheck();
